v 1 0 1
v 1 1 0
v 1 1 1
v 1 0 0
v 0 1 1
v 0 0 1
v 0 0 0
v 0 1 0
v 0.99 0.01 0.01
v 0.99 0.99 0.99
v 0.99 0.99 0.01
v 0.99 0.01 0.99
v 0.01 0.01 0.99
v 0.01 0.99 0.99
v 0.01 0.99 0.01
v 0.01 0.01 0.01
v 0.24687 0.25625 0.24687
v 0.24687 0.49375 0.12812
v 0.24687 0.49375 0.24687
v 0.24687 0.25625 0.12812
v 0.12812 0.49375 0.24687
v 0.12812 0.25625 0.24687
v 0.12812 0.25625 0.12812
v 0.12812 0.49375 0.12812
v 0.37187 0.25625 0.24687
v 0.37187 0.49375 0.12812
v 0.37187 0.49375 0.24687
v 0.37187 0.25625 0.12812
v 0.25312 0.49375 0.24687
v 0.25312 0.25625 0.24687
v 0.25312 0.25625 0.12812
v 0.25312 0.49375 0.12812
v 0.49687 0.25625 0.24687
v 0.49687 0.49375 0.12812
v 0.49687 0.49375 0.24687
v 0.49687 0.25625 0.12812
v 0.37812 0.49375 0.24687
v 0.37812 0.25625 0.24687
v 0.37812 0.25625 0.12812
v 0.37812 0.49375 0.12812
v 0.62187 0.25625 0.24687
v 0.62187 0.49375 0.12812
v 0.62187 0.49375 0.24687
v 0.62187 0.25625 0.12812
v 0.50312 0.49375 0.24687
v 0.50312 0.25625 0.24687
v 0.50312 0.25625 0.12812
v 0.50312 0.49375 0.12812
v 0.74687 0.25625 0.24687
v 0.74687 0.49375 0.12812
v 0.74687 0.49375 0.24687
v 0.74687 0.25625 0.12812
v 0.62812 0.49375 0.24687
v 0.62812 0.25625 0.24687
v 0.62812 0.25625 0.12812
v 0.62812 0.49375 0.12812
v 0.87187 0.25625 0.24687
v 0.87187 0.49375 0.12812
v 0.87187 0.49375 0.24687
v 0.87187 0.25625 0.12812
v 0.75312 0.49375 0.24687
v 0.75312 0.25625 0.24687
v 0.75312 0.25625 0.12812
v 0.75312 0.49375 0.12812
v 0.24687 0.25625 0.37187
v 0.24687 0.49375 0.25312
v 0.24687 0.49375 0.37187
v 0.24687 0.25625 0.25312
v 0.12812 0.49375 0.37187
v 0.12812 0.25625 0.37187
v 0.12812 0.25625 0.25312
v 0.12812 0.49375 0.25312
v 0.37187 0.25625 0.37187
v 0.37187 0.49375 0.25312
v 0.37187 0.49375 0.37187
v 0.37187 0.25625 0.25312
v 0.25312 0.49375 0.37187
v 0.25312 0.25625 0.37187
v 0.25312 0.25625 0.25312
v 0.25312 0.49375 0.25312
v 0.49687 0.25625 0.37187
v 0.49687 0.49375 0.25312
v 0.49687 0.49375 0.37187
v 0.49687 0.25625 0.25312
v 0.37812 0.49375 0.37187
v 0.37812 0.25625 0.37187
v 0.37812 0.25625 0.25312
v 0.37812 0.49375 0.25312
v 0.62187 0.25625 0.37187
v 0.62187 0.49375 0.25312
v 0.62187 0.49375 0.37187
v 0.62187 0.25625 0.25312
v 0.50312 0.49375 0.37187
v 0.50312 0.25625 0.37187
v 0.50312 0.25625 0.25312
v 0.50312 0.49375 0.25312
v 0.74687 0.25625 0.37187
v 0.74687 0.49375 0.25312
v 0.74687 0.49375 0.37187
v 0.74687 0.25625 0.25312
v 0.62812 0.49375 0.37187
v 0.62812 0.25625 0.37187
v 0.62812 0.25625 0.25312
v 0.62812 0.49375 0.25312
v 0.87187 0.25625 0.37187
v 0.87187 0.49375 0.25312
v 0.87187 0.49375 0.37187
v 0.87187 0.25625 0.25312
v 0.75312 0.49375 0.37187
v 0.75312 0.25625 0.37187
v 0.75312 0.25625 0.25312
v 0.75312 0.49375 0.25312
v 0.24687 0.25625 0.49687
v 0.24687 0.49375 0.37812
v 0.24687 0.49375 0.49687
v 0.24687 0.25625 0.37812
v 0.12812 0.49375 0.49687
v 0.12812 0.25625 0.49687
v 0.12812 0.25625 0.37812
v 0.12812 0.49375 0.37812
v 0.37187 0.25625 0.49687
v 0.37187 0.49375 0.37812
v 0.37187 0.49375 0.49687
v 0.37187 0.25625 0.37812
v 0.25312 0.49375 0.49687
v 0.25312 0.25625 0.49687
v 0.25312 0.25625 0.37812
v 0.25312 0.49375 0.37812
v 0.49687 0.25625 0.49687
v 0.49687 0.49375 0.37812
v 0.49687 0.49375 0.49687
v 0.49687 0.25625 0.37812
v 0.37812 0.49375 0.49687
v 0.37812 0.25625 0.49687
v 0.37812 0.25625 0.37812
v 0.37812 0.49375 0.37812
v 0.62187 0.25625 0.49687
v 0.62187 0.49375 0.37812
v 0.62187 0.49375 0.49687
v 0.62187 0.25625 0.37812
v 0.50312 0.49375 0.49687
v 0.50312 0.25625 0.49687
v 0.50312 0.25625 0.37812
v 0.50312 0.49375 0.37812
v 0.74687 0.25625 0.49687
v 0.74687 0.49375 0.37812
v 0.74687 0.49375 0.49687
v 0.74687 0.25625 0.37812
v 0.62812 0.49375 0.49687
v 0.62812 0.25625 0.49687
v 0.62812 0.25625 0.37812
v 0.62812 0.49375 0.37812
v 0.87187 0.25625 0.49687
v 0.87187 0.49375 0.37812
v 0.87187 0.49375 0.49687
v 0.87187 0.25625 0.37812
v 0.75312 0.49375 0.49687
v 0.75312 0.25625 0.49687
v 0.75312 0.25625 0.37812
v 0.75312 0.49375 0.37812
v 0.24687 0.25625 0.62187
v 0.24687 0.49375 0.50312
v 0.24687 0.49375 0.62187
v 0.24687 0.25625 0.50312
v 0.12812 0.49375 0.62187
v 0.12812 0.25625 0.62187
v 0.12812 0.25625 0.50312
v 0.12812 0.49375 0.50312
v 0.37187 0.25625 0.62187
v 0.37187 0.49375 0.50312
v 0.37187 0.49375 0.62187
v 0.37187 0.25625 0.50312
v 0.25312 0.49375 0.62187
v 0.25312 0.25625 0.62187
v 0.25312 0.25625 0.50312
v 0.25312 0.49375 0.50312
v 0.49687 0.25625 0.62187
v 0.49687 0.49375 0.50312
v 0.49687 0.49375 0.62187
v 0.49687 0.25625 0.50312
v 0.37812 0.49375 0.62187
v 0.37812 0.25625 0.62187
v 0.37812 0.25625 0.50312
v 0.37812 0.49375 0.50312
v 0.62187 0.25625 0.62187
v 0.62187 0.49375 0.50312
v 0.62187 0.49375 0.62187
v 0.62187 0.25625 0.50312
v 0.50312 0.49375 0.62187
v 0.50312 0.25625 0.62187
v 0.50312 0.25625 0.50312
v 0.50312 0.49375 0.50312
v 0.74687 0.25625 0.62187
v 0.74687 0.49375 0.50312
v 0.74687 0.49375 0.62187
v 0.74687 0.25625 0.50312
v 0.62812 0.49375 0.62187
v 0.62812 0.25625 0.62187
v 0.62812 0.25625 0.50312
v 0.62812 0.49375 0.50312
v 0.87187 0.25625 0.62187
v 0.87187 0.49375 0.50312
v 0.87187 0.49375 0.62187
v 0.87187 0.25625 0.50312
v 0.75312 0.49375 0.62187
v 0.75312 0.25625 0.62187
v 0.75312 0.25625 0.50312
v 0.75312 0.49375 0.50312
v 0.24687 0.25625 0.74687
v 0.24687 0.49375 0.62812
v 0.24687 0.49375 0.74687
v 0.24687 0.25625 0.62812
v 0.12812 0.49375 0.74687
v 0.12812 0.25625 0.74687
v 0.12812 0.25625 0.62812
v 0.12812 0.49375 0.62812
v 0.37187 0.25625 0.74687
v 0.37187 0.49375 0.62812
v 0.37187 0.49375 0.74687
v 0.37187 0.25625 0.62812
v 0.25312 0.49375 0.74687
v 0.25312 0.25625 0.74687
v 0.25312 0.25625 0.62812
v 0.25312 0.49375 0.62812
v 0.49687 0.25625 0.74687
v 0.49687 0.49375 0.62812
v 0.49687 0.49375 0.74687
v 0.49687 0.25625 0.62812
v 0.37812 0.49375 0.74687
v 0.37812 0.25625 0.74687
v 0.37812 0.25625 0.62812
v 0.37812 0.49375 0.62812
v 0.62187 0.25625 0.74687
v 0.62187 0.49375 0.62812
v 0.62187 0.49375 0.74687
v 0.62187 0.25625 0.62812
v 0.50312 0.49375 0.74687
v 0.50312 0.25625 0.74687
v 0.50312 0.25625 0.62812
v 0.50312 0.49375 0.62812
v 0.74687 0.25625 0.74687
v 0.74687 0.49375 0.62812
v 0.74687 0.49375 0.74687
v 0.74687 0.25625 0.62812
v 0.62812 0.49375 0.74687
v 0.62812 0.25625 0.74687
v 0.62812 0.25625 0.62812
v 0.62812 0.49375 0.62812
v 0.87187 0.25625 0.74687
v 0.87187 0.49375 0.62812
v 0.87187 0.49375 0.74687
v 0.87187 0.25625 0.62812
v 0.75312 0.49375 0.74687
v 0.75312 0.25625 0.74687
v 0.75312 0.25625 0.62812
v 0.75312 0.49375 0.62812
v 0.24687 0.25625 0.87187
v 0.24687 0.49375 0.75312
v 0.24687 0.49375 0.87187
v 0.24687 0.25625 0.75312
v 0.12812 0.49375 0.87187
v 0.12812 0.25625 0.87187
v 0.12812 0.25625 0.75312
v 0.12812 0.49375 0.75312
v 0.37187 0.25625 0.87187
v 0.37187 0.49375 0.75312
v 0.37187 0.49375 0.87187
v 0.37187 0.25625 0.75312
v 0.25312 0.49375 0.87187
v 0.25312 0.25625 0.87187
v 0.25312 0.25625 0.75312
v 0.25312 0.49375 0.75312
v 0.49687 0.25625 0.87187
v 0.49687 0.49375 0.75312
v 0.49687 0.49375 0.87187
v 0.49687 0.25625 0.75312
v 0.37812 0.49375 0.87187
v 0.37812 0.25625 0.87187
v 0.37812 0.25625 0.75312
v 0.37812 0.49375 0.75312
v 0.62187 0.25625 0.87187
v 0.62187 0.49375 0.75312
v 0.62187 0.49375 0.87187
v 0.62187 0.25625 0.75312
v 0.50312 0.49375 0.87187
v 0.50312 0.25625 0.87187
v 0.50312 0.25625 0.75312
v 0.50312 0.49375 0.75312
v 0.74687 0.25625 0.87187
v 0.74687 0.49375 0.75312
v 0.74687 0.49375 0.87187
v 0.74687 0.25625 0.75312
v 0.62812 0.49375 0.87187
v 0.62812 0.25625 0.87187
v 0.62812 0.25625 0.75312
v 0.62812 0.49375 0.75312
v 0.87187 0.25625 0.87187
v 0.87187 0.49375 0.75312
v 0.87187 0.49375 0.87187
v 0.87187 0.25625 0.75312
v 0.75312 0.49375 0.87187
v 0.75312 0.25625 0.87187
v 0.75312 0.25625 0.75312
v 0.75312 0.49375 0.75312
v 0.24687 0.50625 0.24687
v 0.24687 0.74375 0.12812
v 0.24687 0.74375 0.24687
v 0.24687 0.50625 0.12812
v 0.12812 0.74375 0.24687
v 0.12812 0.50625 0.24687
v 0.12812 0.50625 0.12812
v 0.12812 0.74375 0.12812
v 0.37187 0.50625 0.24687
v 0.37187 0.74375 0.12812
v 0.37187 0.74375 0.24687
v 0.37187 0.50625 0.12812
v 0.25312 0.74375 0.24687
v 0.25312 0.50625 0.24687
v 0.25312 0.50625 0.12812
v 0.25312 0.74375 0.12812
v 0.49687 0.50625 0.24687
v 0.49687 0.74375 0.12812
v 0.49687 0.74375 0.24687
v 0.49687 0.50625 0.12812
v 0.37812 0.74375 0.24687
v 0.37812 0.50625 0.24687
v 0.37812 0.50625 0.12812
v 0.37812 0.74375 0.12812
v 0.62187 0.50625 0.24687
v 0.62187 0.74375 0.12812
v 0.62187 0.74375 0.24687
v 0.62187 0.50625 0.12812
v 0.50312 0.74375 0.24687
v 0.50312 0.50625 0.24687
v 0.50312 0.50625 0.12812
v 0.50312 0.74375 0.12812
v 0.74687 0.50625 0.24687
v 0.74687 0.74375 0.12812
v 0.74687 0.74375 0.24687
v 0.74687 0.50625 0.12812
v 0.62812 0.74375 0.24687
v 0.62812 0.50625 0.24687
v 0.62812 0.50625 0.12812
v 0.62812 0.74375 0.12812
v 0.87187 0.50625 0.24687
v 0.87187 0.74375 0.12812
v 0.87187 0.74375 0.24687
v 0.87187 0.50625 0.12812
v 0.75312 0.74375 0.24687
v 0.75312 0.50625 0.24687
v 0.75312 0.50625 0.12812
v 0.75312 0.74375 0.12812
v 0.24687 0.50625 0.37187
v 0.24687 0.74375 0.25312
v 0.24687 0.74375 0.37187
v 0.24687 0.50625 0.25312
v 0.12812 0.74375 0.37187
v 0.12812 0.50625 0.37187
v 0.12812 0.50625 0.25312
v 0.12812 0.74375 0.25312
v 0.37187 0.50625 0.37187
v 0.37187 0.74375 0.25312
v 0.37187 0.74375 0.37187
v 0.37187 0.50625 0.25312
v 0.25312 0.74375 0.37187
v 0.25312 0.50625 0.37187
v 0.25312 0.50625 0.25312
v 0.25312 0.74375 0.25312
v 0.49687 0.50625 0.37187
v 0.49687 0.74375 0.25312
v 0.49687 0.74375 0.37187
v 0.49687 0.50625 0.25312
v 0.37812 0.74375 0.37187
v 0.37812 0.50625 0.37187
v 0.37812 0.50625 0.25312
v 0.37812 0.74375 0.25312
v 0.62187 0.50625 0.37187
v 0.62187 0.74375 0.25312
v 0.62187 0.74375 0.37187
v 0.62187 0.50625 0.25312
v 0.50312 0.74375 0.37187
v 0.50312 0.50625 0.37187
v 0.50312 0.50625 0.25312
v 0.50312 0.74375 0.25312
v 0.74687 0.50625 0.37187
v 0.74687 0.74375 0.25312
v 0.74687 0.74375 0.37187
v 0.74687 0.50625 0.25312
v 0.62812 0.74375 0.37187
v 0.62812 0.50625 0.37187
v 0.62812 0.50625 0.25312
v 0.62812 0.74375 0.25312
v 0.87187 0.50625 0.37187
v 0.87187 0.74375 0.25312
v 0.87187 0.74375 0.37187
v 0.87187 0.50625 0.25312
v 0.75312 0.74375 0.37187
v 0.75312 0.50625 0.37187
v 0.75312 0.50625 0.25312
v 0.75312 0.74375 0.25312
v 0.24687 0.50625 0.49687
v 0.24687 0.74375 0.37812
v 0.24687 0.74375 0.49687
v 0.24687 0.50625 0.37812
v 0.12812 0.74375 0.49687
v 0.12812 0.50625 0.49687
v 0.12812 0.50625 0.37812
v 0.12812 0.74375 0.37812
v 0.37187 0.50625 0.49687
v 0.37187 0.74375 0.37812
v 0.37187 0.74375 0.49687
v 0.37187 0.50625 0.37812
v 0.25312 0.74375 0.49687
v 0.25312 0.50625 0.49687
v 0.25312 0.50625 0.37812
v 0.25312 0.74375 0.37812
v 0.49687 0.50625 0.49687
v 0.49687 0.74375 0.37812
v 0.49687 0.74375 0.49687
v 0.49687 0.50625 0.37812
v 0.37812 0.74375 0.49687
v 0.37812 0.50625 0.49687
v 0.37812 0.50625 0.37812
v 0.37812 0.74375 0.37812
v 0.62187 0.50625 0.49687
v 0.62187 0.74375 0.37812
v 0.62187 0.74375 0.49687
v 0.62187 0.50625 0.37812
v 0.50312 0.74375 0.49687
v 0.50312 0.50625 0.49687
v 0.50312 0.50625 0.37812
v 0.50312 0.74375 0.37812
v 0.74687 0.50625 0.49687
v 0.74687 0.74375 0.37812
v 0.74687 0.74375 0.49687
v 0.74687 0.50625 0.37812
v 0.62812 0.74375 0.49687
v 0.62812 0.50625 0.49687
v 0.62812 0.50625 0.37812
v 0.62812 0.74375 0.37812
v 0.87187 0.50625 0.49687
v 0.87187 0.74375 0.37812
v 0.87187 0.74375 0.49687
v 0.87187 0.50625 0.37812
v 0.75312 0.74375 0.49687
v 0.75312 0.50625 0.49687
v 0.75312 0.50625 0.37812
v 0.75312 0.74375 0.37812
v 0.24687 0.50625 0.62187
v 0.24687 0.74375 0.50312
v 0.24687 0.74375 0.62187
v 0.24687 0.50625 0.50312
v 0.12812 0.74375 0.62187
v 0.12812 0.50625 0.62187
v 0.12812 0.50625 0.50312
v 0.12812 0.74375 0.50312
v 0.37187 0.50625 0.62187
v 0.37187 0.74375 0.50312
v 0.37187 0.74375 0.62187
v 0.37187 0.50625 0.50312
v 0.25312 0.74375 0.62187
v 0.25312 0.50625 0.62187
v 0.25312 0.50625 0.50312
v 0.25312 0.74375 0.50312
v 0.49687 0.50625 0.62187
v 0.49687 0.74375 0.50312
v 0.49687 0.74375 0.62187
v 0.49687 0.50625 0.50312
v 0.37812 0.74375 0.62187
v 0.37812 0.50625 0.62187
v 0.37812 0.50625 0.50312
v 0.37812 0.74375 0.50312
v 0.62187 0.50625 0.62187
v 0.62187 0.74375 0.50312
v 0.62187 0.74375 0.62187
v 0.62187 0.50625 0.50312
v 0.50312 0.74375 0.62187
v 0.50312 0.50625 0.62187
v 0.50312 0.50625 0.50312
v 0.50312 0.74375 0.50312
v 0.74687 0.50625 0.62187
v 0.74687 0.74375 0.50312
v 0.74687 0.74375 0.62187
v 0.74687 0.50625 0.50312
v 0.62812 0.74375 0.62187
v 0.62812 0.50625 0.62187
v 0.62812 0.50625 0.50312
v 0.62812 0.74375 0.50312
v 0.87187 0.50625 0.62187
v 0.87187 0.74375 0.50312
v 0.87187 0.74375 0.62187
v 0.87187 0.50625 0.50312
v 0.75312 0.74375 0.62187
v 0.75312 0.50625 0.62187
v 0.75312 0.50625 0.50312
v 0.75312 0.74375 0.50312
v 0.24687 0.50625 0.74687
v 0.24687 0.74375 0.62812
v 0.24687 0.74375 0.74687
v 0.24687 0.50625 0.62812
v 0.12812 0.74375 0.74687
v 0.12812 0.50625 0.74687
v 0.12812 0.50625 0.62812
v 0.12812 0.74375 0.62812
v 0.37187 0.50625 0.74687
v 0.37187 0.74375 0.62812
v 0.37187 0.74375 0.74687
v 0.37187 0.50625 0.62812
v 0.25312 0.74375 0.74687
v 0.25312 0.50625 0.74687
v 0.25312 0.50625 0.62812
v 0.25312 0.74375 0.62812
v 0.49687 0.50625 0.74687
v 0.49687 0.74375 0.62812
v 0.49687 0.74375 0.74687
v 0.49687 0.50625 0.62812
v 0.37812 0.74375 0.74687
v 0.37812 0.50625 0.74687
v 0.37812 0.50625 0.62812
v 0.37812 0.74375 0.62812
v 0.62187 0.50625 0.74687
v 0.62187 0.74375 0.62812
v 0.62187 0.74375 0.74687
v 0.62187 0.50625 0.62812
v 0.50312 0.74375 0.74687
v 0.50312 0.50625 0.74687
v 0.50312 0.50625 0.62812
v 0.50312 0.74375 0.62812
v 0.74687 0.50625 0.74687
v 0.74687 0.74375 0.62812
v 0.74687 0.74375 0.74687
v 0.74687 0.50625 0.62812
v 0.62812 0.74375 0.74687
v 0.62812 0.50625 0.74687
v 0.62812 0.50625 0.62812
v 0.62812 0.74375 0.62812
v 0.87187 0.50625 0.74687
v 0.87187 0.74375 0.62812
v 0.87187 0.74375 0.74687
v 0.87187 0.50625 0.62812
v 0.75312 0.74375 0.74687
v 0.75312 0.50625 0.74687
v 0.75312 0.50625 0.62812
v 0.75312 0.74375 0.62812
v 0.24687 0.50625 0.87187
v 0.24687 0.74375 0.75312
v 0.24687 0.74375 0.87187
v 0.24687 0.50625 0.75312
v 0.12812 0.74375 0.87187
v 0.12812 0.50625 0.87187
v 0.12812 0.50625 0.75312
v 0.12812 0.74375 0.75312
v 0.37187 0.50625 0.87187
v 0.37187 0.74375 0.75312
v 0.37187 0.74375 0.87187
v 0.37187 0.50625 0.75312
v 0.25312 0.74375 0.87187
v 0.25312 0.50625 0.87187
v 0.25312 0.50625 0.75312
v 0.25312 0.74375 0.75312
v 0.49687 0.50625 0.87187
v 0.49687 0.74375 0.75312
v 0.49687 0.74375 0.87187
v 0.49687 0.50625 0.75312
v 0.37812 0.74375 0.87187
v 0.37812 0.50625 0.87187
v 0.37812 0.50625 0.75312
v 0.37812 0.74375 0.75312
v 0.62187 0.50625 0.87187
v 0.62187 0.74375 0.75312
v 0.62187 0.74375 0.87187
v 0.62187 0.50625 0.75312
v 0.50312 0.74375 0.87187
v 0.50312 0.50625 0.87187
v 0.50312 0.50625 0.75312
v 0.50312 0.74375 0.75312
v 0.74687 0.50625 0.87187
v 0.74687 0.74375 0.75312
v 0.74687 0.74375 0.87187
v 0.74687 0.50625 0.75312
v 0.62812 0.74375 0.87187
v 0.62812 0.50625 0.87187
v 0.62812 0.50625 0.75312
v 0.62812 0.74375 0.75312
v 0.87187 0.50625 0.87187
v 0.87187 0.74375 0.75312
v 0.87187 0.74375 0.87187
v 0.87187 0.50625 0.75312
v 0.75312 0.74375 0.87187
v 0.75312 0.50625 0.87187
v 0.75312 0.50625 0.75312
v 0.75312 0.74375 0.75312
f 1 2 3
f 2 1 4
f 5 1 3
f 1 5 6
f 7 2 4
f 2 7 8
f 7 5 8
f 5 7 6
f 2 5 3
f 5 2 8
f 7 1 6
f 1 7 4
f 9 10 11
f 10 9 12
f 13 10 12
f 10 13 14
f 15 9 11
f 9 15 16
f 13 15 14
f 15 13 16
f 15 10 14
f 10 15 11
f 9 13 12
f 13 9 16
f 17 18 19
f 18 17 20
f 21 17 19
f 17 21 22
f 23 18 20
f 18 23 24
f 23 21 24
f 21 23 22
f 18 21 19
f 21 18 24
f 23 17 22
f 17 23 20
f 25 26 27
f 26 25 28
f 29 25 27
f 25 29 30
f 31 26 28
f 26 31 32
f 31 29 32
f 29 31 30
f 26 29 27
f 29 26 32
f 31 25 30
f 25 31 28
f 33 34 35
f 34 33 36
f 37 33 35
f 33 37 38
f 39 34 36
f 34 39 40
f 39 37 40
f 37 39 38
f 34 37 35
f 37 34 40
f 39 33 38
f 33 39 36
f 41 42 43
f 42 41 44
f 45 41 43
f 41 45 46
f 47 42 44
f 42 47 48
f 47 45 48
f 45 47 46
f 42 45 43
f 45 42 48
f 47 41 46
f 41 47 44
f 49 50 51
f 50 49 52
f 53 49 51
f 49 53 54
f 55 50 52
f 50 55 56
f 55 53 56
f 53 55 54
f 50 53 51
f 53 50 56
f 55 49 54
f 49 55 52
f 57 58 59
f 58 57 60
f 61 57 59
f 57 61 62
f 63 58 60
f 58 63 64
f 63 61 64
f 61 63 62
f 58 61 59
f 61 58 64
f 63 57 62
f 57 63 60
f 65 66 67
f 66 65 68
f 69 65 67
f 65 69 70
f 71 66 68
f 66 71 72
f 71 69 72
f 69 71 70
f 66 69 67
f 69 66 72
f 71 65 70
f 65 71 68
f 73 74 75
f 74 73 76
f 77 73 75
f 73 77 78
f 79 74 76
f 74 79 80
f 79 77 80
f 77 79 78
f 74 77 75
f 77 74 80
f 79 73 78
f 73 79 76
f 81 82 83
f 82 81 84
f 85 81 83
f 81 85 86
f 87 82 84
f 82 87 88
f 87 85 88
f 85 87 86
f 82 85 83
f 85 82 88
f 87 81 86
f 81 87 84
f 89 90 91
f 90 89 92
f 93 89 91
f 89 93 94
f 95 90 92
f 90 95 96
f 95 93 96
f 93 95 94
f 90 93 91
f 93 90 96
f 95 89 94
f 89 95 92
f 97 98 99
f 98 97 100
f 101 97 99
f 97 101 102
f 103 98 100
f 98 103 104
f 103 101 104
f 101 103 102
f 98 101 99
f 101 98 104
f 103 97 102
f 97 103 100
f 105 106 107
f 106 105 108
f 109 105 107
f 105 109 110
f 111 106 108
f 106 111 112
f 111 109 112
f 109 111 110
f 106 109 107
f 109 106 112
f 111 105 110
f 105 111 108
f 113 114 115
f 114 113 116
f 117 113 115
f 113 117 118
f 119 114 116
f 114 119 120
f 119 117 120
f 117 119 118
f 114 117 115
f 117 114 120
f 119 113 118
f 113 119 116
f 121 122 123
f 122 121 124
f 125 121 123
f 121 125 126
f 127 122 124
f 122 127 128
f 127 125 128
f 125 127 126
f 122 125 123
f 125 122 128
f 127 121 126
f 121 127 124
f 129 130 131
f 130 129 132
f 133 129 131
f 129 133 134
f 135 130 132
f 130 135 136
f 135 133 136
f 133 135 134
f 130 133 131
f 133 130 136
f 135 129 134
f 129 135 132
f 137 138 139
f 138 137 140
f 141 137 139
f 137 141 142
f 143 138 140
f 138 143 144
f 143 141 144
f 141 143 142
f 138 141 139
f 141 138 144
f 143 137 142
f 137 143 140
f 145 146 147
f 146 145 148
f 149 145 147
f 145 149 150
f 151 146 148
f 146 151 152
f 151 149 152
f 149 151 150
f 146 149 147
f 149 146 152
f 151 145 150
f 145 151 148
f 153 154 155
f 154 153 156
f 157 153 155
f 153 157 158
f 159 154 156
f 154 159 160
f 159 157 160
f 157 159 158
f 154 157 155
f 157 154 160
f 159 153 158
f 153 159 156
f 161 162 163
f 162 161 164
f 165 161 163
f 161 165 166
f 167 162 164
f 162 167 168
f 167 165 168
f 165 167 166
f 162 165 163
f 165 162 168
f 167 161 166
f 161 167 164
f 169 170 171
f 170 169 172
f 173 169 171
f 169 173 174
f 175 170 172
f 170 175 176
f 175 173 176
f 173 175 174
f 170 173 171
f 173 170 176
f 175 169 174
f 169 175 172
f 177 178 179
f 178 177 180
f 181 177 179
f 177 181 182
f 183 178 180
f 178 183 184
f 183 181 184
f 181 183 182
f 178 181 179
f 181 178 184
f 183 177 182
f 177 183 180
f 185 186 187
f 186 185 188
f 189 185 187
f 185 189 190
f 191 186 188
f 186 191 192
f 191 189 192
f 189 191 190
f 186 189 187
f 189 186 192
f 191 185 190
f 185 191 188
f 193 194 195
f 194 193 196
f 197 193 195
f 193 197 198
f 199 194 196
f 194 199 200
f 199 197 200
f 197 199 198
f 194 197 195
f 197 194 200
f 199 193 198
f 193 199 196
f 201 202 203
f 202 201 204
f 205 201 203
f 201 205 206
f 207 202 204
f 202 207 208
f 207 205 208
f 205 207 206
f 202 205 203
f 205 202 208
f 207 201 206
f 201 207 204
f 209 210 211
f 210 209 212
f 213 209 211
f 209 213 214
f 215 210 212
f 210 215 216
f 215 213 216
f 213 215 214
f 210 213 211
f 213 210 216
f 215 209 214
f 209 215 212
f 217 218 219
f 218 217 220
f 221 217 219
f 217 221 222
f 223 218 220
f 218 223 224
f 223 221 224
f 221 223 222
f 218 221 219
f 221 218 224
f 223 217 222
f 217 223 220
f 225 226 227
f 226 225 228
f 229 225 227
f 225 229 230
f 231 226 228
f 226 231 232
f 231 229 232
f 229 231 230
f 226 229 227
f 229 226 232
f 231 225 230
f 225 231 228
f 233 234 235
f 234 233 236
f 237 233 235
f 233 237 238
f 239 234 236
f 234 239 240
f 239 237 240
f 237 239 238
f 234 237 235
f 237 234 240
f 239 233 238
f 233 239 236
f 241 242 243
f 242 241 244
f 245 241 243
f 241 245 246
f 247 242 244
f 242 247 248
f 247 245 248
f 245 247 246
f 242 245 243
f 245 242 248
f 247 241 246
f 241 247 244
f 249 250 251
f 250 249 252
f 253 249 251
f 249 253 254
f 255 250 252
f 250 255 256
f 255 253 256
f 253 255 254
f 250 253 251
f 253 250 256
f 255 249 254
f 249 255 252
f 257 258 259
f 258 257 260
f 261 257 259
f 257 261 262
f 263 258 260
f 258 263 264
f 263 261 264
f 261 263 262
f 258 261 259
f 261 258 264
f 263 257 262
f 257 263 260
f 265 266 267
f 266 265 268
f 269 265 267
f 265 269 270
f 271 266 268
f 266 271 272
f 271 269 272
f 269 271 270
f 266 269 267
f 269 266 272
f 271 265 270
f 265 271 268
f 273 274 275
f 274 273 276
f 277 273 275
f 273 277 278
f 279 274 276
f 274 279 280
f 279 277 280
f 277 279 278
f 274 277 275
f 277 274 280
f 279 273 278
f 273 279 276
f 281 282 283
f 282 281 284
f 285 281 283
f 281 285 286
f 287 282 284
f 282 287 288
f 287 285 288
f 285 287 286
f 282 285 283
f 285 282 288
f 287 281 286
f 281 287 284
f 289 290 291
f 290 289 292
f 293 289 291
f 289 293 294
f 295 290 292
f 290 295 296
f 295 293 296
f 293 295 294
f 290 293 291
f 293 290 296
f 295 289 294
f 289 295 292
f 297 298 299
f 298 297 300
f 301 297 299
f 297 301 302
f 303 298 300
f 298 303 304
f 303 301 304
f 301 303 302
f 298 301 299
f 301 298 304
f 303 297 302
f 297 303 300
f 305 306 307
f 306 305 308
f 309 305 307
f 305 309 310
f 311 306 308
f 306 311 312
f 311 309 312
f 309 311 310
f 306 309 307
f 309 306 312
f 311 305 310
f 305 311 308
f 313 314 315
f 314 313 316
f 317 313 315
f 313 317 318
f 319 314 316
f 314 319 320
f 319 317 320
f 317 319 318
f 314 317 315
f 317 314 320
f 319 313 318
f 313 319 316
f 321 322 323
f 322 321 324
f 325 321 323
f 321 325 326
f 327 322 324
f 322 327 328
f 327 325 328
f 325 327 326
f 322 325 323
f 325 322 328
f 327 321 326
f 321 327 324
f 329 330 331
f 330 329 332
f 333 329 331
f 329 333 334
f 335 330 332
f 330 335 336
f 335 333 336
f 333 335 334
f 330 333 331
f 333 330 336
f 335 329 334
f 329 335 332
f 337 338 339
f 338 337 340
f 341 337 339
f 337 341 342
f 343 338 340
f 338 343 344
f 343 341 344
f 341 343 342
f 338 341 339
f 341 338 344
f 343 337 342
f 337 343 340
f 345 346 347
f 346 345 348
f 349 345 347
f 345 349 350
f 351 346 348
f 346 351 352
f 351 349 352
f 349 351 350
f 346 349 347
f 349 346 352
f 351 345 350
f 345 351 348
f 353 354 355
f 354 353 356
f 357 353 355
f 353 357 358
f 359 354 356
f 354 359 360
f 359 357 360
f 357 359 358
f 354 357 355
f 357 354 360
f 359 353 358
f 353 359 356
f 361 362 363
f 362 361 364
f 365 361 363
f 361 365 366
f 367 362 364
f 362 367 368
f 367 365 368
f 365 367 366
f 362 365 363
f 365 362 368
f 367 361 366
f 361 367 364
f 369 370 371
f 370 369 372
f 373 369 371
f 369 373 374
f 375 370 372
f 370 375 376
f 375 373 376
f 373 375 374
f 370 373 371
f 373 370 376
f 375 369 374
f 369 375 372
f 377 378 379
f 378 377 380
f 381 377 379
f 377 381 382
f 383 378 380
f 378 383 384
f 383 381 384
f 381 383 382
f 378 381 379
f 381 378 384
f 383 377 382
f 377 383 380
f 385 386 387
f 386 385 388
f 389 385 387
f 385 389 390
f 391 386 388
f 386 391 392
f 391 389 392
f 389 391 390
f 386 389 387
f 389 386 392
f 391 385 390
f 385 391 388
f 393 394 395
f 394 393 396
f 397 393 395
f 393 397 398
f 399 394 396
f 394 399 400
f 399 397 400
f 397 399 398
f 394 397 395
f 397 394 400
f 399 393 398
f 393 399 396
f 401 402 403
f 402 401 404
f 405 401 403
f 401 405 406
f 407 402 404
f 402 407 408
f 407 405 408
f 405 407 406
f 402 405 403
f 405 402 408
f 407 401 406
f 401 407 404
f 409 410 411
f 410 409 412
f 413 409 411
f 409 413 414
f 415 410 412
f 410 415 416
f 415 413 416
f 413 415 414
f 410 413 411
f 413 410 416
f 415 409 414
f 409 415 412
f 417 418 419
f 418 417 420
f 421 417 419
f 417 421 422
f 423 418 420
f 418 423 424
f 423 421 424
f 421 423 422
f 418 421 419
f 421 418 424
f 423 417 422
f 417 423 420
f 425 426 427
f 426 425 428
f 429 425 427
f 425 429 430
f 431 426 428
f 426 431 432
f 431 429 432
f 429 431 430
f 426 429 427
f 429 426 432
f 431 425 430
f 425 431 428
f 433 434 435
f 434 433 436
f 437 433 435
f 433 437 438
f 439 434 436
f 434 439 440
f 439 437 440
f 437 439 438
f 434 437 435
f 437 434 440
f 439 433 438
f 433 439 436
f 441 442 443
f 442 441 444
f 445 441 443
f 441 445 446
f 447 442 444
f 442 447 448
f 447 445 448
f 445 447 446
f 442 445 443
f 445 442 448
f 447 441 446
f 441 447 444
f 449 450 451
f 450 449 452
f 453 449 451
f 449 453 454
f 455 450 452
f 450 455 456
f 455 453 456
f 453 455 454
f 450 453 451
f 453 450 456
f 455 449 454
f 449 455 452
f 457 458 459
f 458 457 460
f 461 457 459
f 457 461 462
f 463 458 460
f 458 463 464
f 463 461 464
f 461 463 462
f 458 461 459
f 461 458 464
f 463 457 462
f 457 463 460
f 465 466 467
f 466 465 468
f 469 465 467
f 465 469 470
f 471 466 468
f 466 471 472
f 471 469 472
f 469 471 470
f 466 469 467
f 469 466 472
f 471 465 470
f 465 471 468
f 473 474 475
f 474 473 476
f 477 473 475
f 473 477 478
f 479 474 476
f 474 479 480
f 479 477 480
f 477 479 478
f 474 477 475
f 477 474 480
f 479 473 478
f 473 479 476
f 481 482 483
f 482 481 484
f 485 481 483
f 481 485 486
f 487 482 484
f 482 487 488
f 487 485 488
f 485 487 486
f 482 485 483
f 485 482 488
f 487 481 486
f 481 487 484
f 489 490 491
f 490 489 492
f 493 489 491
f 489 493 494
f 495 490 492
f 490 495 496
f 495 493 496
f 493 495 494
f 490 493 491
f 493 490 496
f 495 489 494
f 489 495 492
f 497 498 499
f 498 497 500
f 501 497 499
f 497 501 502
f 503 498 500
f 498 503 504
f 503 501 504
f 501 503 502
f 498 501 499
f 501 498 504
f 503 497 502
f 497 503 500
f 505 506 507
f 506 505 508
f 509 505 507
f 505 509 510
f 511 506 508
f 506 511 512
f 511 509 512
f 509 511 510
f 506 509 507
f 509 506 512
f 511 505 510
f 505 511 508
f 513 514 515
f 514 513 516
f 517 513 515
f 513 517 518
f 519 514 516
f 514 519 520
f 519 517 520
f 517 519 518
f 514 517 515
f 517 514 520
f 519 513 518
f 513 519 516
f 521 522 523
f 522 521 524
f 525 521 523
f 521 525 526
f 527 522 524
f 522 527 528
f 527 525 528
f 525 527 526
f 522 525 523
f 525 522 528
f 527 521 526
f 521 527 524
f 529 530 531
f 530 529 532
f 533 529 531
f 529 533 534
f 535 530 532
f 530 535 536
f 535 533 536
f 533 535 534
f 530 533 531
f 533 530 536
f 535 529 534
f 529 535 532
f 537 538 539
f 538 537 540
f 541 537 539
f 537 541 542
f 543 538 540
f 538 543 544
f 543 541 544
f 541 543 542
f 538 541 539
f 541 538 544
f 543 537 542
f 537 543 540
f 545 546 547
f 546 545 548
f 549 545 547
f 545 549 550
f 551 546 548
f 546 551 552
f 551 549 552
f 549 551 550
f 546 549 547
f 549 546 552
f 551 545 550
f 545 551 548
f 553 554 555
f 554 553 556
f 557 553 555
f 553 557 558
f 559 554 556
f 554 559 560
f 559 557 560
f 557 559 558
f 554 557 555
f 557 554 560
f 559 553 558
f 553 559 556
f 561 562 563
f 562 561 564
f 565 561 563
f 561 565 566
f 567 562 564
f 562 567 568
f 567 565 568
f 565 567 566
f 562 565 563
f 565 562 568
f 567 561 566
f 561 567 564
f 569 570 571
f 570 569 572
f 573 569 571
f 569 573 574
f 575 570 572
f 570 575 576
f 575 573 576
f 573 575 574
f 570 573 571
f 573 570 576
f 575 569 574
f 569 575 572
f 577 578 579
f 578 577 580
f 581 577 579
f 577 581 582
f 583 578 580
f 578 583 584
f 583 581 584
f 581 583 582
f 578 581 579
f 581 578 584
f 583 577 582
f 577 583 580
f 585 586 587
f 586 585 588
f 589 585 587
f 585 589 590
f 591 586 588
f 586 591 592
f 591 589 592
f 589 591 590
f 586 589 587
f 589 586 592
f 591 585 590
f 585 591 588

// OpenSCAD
translate([0.1875, 0.375, 0.1875]) color([0.3846464495954227, 0.3794414211645075, 0.7643773332264734]) cube([0.11875, 0.2375, 0.11875], center=true);
translate([0.3125, 0.375, 0.1875]) color([0.3116889002403487, 0.7690158776827113, 0.7674729074453902]) cube([0.11875, 0.2375, 0.11875], center=true);
translate([0.4375, 0.375, 0.1875]) color([0.3394448706328078, 0.45855440081433096, 0.0007502935671159783]) cube([0.11875, 0.2375, 0.11875], center=true);
translate([0.5625, 0.375, 0.1875]) color([0.8084995756647368, 0.0331322283588068, 0.9954935019736515]) cube([0.11875, 0.2375, 0.11875], center=true);
translate([0.6875, 0.375, 0.1875]) color([0.32750610520168044, 0.511786711221762, 0.09639677946248049]) cube([0.11875, 0.2375, 0.11875], center=true);
translate([0.8125, 0.375, 0.1875]) color([0.46647601470953737, 0.043404226035316795, 0.8089506697449751]) cube([0.11875, 0.2375, 0.11875], center=true);
translate([0.1875, 0.375, 0.3125]) color([0.9065579579370614, 0.48874197586323487, 0.4689182776921319]) cube([0.11875, 0.2375, 0.11875], center=true);
translate([0.3125, 0.375, 0.3125]) color([0.9999833648369341, 0.42392948264922625, 0.11056216143511133]) cube([0.11875, 0.2375, 0.11875], center=true);
translate([0.4375, 0.375, 0.3125]) color([0.5007484231317689, 0.23725843071495933, 0.7435751616565288]) cube([0.11875, 0.2375, 0.11875], center=true);
translate([0.5625, 0.375, 0.3125]) color([0.030326511183225713, 0.9534383365251057, 0.44454391677925087]) cube([0.11875, 0.2375, 0.11875], center=true);
translate([0.6875, 0.375, 0.3125]) color([0.4017260225039573, 0.6984802625757133, 0.14751428227125585]) cube([0.11875, 0.2375, 0.11875], center=true);
translate([0.8125, 0.375, 0.3125]) color([0.592053202978914, 0.7602792343344718, 0.23214841748979886]) cube([0.11875, 0.2375, 0.11875], center=true);
translate([0.1875, 0.375, 0.4375]) color([0.2215781656479593, 0.24536616409996503, 0.7021925659500807]) cube([0.11875, 0.2375, 0.11875], center=true);
translate([0.3125, 0.375, 0.4375]) color([0.5457605096294114, 0.54011508338913, 0.5459453680001618]) cube([0.11875, 0.2375, 0.11875], center=true);
translate([0.4375, 0.375, 0.4375]) color([0.21439919344985514, 0.4167057873106884, 0.6193494045718565]) cube([0.11875, 0.2375, 0.11875], center=true);
translate([0.5625, 0.375, 0.4375]) color([0.45760594266221877, 0.8933837090972113, 0.8109172526149769]) cube([0.11875, 0.2375, 0.11875], center=true);
translate([0.6875, 0.375, 0.4375]) color([0.14833972802097417, 0.6068004170768148, 0.5080529466064481]) cube([0.11875, 0.2375, 0.11875], center=true);
translate([0.8125, 0.375, 0.4375]) color([0.9906187087676633, 0.11352393843166497, 0.6883720652754897]) cube([0.11875, 0.2375, 0.11875], center=true);
translate([0.1875, 0.375, 0.5625]) color([0.5952346609945763, 0.6540807806784664, 0.3474259839548979]) cube([0.11875, 0.2375, 0.11875], center=true);
translate([0.3125, 0.375, 0.5625]) color([0.9928586924360654, 0.247192741454632, 0.70975753974483]) cube([0.11875, 0.2375, 0.11875], center=true);
translate([0.4375, 0.375, 0.5625]) color([0.13794757021236903, 0.4611444179186315, 0.04899626755467579]) cube([0.11875, 0.2375, 0.11875], center=true);
translate([0.5625, 0.375, 0.5625]) color([0.1977229983916683, 0.036370797334404625, 0.13840798504488894]) cube([0.11875, 0.2375, 0.11875], center=true);
translate([0.6875, 0.375, 0.5625]) color([0.695134065044521, 0.2654011745990712, 0.4635417367699751]) cube([0.11875, 0.2375, 0.11875], center=true);
translate([0.8125, 0.375, 0.5625]) color([0.14067843926211876, 0.3233092624720053, 0.6766209265725885]) cube([0.11875, 0.2375, 0.11875], center=true);
translate([0.1875, 0.375, 0.6875]) color([0.5598941248919586, 0.2674263193966361, 0.7715367321750608]) cube([0.11875, 0.2375, 0.11875], center=true);
translate([0.3125, 0.375, 0.6875]) color([0.7775867750177572, 0.3358457771023752, 0.7984986383285079]) cube([0.11875, 0.2375, 0.11875], center=true);
translate([0.4375, 0.375, 0.6875]) color([0.3608344962449672, 0.130636609727118, 0.1470050456404287]) cube([0.11875, 0.2375, 0.11875], center=true);
translate([0.5625, 0.375, 0.6875]) color([0.5817121628313788, 0.46286602772829477, 0.8824527290015699]) cube([0.11875, 0.2375, 0.11875], center=true);
translate([0.6875, 0.375, 0.6875]) color([0.1201105517589024, 0.1938197880719691, 0.4695931850983104]) cube([0.11875, 0.2375, 0.11875], center=true);
translate([0.8125, 0.375, 0.6875]) color([0.14078313852784263, 0.6451769219884874, 0.9811903017448982]) cube([0.11875, 0.2375, 0.11875], center=true);
translate([0.1875, 0.375, 0.8125]) color([0.8740229692652243, 0.6541461711493592, 0.21289315855754942]) cube([0.11875, 0.2375, 0.11875], center=true);
translate([0.3125, 0.375, 0.8125]) color([0.9328418457966335, 0.42345059226773774, 0.5012376899041451]) cube([0.11875, 0.2375, 0.11875], center=true);
translate([0.4375, 0.375, 0.8125]) color([0.5811541702347708, 0.2791891573101454, 0.2092311813057095]) cube([0.11875, 0.2375, 0.11875], center=true);
translate([0.5625, 0.375, 0.8125]) color([0.9628933046967749, 0.6198760626942967, 0.5999578261672418]) cube([0.11875, 0.2375, 0.11875], center=true);
translate([0.6875, 0.375, 0.8125]) color([0.23874719597172656, 0.5159213977515871, 0.8042715508319355]) cube([0.11875, 0.2375, 0.11875], center=true);
translate([0.8125, 0.375, 0.8125]) color([0.6755197251802578, 0.41487488756696345, 0.5733633065217538]) cube([0.11875, 0.2375, 0.11875], center=true);
translate([0.1875, 0.625, 0.1875]) color([0.8352652083788017, 0.4789645616530247, 0.8888242662849705]) cube([0.11875, 0.2375, 0.11875], center=true);
translate([0.3125, 0.625, 0.1875]) color([0.7977003312522131, 0.4430245559395397, 0.5757872208285841]) cube([0.11875, 0.2375, 0.11875], center=true);
translate([0.4375, 0.625, 0.1875]) color([0.18894415855786206, 0.8084526775944827, 0.5240727557148024]) cube([0.11875, 0.2375, 0.11875], center=true);
translate([0.5625, 0.625, 0.1875]) color([0.33009817895383553, 0.6358447971330878, 0.274476683198677]) cube([0.11875, 0.2375, 0.11875], center=true);
translate([0.6875, 0.625, 0.1875]) color([0.7036882936284021, 0.9548751840233447, 0.5755708060880032]) cube([0.11875, 0.2375, 0.11875], center=true);
translate([0.8125, 0.625, 0.1875]) color([0.41204698353559877, 0.5796286851254486, 0.28286322414623355]) cube([0.11875, 0.2375, 0.11875], center=true);
translate([0.1875, 0.625, 0.3125]) color([0.83488960487533, 0.7968053445508819, 0.9111606805714901]) cube([0.11875, 0.2375, 0.11875], center=true);
translate([0.3125, 0.625, 0.3125]) color([0.24277728252059738, 0.2698201644401115, 0.25372921938475945]) cube([0.11875, 0.2375, 0.11875], center=true);
translate([0.4375, 0.625, 0.3125]) color([0.3248429479181304, 0.33731838939050207, 0.46012102584031667]) cube([0.11875, 0.2375, 0.11875], center=true);
translate([0.5625, 0.625, 0.3125]) color([0.4972140619467261, 0.4460540182101679, 0.582257111213957]) cube([0.11875, 0.2375, 0.11875], center=true);
translate([0.6875, 0.625, 0.3125]) color([0.38189019333285656, 0.9329183366158048, 0.74346568951076]) cube([0.11875, 0.2375, 0.11875], center=true);
translate([0.8125, 0.625, 0.3125]) color([0.10367473231816282, 0.6513301228797536, 0.21210212161149367]) cube([0.11875, 0.2375, 0.11875], center=true);
translate([0.1875, 0.625, 0.4375]) color([0.4071949612628585, 0.6715659813617996, 0.17871221391606673]) cube([0.11875, 0.2375, 0.11875], center=true);
translate([0.3125, 0.625, 0.4375]) color([0.17752412341011714, 0.6556599876579107, 0.7040052939421468]) cube([0.11875, 0.2375, 0.11875], center=true);
translate([0.4375, 0.625, 0.4375]) color([0.9236087761692187, 0.21340315940002685, 0.5989435772305987]) cube([0.11875, 0.2375, 0.11875], center=true);
translate([0.5625, 0.625, 0.4375]) color([0.8450733127471588, 0.6003349610680997, 0.5954496070156984]) cube([0.11875, 0.2375, 0.11875], center=true);
translate([0.6875, 0.625, 0.4375]) color([0.920709623693076, 0.4233833186292486, 0.4754938941291812]) cube([0.11875, 0.2375, 0.11875], center=true);
translate([0.8125, 0.625, 0.4375]) color([0.872421437716006, 0.9767589381362137, 0.9086126193256788]) cube([0.11875, 0.2375, 0.11875], center=true);
translate([0.1875, 0.625, 0.5625]) color([0.7884233486788577, 0.8262914624918754, 0.6636415038118221]) cube([0.11875, 0.2375, 0.11875], center=true);
translate([0.3125, 0.625, 0.5625]) color([0.36270118963089737, 0.5138414630226216, 0.14357255994509865]) cube([0.11875, 0.2375, 0.11875], center=true);
translate([0.4375, 0.625, 0.5625]) color([0.466624584989368, 0.29734697142143796, 0.9844700368526675]) cube([0.11875, 0.2375, 0.11875], center=true);
translate([0.5625, 0.625, 0.5625]) color([0.6752891164641136, 0.29017518075598103, 0.4342964607752302]) cube([0.11875, 0.2375, 0.11875], center=true);
translate([0.6875, 0.625, 0.5625]) color([0.773003957160343, 0.565247166210502, 0.9239404304157245]) cube([0.11875, 0.2375, 0.11875], center=true);
translate([0.8125, 0.625, 0.5625]) color([0.16032310979410902, 0.8355206000915061, 0.5688487402091276]) cube([0.11875, 0.2375, 0.11875], center=true);
translate([0.1875, 0.625, 0.6875]) color([0.20030491603062106, 0.9799112189115262, 0.7788088383598656]) cube([0.11875, 0.2375, 0.11875], center=true);
translate([0.3125, 0.625, 0.6875]) color([0.3331229107175697, 0.956723341350572, 0.8892995412421422]) cube([0.11875, 0.2375, 0.11875], center=true);
translate([0.4375, 0.625, 0.6875]) color([0.9938355783742772, 0.5564778243748569, 0.9329279768345969]) cube([0.11875, 0.2375, 0.11875], center=true);
translate([0.5625, 0.625, 0.6875]) color([0.35340897744289224, 0.12062022214202717, 0.7238287945893779]) cube([0.11875, 0.2375, 0.11875], center=true);
translate([0.6875, 0.625, 0.6875]) color([0.8432397019629626, 0.2883830928152321, 0.23139986036280558]) cube([0.11875, 0.2375, 0.11875], center=true);
translate([0.8125, 0.625, 0.6875]) color([0.0180364627349191, 0.35314011923198985, 0.9589424474672257]) cube([0.11875, 0.2375, 0.11875], center=true);
translate([0.1875, 0.625, 0.8125]) color([0.2619290021782883, 0.20369548429490625, 0.5420815487250377]) cube([0.11875, 0.2375, 0.11875], center=true);
translate([0.3125, 0.625, 0.8125]) color([0.9221305525684157, 0.837748898711002, 0.8622867035840079]) cube([0.11875, 0.2375, 0.11875], center=true);
translate([0.4375, 0.625, 0.8125]) color([0.727429224436118, 0.821332708873966, 0.2567577523046298]) cube([0.11875, 0.2375, 0.11875], center=true);
translate([0.5625, 0.625, 0.8125]) color([0.1353372895865157, 0.7613019869252476, 0.15437996216449157]) cube([0.11875, 0.2375, 0.11875], center=true);
translate([0.6875, 0.625, 0.8125]) color([0.5724302025923821, 0.22728732004270547, 0.8377719495956792]) cube([0.11875, 0.2375, 0.11875], center=true);
translate([0.8125, 0.625, 0.8125]) color([0.3661955888727618, 0.7135191579002272, 0.515047468161266]) cube([0.11875, 0.2375, 0.11875], center=true);
color([0.3,0.3,0.3,0.3]) difference() { cube([1,1,1]); translate([0.01,0.01,0.01]) cube([0.98,0.98,0.98]); }
